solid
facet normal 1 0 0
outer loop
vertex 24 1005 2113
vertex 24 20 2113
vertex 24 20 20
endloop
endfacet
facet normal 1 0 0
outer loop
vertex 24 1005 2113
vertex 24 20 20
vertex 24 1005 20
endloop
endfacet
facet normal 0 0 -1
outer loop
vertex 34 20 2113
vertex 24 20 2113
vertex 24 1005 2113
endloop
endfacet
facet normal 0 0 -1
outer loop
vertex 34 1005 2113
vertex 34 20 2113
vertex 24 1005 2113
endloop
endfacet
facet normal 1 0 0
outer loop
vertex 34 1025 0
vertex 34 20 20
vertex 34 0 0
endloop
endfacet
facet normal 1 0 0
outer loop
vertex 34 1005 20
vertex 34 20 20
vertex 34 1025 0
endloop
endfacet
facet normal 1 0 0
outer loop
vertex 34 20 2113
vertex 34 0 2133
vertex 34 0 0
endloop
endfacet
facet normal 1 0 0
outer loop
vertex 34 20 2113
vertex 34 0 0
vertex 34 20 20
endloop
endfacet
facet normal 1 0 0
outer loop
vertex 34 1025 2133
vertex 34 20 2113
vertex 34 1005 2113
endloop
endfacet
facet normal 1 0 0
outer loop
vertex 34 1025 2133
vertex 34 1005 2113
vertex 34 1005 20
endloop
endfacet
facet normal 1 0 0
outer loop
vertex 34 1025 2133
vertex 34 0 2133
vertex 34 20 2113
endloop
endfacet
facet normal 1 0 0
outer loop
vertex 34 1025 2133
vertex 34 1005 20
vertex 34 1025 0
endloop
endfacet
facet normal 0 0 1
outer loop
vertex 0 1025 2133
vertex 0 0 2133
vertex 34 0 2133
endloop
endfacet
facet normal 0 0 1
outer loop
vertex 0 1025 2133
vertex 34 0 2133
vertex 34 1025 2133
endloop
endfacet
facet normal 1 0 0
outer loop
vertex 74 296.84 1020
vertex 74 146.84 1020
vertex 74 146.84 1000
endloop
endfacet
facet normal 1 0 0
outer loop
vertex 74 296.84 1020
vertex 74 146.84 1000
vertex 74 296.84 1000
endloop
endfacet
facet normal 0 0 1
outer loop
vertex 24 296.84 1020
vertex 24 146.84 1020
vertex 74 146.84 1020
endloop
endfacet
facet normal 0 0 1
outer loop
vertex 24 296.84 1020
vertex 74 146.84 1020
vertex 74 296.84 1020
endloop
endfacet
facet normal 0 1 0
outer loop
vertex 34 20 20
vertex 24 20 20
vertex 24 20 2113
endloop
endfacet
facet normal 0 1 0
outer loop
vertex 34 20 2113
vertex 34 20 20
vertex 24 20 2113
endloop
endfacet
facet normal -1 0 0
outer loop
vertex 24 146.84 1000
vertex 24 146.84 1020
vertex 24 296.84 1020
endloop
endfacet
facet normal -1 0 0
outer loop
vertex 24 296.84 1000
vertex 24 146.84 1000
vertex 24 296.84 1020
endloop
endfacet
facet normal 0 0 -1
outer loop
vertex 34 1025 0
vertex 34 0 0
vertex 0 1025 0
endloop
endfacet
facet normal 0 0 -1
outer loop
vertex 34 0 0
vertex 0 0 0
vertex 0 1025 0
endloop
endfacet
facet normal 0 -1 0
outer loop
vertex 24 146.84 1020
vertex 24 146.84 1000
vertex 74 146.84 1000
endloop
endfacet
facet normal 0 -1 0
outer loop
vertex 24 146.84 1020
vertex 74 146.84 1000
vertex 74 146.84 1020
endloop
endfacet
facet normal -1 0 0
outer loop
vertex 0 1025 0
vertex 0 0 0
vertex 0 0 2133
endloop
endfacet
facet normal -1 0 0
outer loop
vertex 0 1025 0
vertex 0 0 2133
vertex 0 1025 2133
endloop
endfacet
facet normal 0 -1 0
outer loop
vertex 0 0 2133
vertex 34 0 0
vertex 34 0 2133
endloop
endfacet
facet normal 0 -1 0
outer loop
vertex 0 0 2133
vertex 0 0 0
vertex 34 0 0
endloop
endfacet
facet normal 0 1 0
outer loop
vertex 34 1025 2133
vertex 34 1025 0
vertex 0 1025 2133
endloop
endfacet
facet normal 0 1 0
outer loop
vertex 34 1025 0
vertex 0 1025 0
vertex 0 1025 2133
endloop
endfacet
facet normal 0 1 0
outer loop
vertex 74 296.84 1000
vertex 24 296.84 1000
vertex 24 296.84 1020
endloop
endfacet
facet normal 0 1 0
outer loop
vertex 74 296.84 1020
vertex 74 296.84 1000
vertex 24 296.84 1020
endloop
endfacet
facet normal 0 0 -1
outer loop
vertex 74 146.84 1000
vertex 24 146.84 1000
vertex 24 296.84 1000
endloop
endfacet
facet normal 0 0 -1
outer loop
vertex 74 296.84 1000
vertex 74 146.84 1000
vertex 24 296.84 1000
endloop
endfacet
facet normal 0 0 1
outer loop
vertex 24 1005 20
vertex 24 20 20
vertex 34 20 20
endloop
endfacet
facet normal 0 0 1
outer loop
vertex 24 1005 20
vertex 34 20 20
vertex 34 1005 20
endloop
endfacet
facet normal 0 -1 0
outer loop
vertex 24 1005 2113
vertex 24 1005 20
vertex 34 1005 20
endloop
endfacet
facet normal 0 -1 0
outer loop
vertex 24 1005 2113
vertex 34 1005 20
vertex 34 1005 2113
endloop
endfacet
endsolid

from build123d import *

# Parameters (mm, degrees)
F0_W     = 1025
F0_H     = 2133
F1_DEPTH = 24
F2_W     = 150
F2_H     = 20
F3_DEPTH = 50
F4_W     = 1025
F4_H     = 2133
F4_W_2   = 985
F4_H_2   = 2093
F5_DEPTH = 10


with BuildPart() as f1:
    # F0 (on Right) → F1 (new body)
    with BuildSketch(Plane.YZ):
        with Locations((512.5, 1066.5)):
            Rectangle(F0_W, F0_H)
    extrude(amount=F1_DEPTH)

    # F4 (on face) → F5 (join)
    with BuildSketch(Plane.YZ.offset(24)):
        with Locations((512.5, 1066.5)):
            Rectangle(F4_W, F4_H)
        with Locations((512.5, 1066.5)):
            Rectangle(F4_W_2, F4_H_2, mode=Mode.SUBTRACT)
    extrude(amount=F5_DEPTH)


with BuildPart() as f3:
    # F2 (on face) → F3 (new body)
    with BuildSketch(Plane.YZ.offset(24)):
        with Locations((221.840221, 1010)):
            Rectangle(F2_W, F2_H)
    extrude(amount=F3_DEPTH)


solid = Compound([f1.part, f3.part])
